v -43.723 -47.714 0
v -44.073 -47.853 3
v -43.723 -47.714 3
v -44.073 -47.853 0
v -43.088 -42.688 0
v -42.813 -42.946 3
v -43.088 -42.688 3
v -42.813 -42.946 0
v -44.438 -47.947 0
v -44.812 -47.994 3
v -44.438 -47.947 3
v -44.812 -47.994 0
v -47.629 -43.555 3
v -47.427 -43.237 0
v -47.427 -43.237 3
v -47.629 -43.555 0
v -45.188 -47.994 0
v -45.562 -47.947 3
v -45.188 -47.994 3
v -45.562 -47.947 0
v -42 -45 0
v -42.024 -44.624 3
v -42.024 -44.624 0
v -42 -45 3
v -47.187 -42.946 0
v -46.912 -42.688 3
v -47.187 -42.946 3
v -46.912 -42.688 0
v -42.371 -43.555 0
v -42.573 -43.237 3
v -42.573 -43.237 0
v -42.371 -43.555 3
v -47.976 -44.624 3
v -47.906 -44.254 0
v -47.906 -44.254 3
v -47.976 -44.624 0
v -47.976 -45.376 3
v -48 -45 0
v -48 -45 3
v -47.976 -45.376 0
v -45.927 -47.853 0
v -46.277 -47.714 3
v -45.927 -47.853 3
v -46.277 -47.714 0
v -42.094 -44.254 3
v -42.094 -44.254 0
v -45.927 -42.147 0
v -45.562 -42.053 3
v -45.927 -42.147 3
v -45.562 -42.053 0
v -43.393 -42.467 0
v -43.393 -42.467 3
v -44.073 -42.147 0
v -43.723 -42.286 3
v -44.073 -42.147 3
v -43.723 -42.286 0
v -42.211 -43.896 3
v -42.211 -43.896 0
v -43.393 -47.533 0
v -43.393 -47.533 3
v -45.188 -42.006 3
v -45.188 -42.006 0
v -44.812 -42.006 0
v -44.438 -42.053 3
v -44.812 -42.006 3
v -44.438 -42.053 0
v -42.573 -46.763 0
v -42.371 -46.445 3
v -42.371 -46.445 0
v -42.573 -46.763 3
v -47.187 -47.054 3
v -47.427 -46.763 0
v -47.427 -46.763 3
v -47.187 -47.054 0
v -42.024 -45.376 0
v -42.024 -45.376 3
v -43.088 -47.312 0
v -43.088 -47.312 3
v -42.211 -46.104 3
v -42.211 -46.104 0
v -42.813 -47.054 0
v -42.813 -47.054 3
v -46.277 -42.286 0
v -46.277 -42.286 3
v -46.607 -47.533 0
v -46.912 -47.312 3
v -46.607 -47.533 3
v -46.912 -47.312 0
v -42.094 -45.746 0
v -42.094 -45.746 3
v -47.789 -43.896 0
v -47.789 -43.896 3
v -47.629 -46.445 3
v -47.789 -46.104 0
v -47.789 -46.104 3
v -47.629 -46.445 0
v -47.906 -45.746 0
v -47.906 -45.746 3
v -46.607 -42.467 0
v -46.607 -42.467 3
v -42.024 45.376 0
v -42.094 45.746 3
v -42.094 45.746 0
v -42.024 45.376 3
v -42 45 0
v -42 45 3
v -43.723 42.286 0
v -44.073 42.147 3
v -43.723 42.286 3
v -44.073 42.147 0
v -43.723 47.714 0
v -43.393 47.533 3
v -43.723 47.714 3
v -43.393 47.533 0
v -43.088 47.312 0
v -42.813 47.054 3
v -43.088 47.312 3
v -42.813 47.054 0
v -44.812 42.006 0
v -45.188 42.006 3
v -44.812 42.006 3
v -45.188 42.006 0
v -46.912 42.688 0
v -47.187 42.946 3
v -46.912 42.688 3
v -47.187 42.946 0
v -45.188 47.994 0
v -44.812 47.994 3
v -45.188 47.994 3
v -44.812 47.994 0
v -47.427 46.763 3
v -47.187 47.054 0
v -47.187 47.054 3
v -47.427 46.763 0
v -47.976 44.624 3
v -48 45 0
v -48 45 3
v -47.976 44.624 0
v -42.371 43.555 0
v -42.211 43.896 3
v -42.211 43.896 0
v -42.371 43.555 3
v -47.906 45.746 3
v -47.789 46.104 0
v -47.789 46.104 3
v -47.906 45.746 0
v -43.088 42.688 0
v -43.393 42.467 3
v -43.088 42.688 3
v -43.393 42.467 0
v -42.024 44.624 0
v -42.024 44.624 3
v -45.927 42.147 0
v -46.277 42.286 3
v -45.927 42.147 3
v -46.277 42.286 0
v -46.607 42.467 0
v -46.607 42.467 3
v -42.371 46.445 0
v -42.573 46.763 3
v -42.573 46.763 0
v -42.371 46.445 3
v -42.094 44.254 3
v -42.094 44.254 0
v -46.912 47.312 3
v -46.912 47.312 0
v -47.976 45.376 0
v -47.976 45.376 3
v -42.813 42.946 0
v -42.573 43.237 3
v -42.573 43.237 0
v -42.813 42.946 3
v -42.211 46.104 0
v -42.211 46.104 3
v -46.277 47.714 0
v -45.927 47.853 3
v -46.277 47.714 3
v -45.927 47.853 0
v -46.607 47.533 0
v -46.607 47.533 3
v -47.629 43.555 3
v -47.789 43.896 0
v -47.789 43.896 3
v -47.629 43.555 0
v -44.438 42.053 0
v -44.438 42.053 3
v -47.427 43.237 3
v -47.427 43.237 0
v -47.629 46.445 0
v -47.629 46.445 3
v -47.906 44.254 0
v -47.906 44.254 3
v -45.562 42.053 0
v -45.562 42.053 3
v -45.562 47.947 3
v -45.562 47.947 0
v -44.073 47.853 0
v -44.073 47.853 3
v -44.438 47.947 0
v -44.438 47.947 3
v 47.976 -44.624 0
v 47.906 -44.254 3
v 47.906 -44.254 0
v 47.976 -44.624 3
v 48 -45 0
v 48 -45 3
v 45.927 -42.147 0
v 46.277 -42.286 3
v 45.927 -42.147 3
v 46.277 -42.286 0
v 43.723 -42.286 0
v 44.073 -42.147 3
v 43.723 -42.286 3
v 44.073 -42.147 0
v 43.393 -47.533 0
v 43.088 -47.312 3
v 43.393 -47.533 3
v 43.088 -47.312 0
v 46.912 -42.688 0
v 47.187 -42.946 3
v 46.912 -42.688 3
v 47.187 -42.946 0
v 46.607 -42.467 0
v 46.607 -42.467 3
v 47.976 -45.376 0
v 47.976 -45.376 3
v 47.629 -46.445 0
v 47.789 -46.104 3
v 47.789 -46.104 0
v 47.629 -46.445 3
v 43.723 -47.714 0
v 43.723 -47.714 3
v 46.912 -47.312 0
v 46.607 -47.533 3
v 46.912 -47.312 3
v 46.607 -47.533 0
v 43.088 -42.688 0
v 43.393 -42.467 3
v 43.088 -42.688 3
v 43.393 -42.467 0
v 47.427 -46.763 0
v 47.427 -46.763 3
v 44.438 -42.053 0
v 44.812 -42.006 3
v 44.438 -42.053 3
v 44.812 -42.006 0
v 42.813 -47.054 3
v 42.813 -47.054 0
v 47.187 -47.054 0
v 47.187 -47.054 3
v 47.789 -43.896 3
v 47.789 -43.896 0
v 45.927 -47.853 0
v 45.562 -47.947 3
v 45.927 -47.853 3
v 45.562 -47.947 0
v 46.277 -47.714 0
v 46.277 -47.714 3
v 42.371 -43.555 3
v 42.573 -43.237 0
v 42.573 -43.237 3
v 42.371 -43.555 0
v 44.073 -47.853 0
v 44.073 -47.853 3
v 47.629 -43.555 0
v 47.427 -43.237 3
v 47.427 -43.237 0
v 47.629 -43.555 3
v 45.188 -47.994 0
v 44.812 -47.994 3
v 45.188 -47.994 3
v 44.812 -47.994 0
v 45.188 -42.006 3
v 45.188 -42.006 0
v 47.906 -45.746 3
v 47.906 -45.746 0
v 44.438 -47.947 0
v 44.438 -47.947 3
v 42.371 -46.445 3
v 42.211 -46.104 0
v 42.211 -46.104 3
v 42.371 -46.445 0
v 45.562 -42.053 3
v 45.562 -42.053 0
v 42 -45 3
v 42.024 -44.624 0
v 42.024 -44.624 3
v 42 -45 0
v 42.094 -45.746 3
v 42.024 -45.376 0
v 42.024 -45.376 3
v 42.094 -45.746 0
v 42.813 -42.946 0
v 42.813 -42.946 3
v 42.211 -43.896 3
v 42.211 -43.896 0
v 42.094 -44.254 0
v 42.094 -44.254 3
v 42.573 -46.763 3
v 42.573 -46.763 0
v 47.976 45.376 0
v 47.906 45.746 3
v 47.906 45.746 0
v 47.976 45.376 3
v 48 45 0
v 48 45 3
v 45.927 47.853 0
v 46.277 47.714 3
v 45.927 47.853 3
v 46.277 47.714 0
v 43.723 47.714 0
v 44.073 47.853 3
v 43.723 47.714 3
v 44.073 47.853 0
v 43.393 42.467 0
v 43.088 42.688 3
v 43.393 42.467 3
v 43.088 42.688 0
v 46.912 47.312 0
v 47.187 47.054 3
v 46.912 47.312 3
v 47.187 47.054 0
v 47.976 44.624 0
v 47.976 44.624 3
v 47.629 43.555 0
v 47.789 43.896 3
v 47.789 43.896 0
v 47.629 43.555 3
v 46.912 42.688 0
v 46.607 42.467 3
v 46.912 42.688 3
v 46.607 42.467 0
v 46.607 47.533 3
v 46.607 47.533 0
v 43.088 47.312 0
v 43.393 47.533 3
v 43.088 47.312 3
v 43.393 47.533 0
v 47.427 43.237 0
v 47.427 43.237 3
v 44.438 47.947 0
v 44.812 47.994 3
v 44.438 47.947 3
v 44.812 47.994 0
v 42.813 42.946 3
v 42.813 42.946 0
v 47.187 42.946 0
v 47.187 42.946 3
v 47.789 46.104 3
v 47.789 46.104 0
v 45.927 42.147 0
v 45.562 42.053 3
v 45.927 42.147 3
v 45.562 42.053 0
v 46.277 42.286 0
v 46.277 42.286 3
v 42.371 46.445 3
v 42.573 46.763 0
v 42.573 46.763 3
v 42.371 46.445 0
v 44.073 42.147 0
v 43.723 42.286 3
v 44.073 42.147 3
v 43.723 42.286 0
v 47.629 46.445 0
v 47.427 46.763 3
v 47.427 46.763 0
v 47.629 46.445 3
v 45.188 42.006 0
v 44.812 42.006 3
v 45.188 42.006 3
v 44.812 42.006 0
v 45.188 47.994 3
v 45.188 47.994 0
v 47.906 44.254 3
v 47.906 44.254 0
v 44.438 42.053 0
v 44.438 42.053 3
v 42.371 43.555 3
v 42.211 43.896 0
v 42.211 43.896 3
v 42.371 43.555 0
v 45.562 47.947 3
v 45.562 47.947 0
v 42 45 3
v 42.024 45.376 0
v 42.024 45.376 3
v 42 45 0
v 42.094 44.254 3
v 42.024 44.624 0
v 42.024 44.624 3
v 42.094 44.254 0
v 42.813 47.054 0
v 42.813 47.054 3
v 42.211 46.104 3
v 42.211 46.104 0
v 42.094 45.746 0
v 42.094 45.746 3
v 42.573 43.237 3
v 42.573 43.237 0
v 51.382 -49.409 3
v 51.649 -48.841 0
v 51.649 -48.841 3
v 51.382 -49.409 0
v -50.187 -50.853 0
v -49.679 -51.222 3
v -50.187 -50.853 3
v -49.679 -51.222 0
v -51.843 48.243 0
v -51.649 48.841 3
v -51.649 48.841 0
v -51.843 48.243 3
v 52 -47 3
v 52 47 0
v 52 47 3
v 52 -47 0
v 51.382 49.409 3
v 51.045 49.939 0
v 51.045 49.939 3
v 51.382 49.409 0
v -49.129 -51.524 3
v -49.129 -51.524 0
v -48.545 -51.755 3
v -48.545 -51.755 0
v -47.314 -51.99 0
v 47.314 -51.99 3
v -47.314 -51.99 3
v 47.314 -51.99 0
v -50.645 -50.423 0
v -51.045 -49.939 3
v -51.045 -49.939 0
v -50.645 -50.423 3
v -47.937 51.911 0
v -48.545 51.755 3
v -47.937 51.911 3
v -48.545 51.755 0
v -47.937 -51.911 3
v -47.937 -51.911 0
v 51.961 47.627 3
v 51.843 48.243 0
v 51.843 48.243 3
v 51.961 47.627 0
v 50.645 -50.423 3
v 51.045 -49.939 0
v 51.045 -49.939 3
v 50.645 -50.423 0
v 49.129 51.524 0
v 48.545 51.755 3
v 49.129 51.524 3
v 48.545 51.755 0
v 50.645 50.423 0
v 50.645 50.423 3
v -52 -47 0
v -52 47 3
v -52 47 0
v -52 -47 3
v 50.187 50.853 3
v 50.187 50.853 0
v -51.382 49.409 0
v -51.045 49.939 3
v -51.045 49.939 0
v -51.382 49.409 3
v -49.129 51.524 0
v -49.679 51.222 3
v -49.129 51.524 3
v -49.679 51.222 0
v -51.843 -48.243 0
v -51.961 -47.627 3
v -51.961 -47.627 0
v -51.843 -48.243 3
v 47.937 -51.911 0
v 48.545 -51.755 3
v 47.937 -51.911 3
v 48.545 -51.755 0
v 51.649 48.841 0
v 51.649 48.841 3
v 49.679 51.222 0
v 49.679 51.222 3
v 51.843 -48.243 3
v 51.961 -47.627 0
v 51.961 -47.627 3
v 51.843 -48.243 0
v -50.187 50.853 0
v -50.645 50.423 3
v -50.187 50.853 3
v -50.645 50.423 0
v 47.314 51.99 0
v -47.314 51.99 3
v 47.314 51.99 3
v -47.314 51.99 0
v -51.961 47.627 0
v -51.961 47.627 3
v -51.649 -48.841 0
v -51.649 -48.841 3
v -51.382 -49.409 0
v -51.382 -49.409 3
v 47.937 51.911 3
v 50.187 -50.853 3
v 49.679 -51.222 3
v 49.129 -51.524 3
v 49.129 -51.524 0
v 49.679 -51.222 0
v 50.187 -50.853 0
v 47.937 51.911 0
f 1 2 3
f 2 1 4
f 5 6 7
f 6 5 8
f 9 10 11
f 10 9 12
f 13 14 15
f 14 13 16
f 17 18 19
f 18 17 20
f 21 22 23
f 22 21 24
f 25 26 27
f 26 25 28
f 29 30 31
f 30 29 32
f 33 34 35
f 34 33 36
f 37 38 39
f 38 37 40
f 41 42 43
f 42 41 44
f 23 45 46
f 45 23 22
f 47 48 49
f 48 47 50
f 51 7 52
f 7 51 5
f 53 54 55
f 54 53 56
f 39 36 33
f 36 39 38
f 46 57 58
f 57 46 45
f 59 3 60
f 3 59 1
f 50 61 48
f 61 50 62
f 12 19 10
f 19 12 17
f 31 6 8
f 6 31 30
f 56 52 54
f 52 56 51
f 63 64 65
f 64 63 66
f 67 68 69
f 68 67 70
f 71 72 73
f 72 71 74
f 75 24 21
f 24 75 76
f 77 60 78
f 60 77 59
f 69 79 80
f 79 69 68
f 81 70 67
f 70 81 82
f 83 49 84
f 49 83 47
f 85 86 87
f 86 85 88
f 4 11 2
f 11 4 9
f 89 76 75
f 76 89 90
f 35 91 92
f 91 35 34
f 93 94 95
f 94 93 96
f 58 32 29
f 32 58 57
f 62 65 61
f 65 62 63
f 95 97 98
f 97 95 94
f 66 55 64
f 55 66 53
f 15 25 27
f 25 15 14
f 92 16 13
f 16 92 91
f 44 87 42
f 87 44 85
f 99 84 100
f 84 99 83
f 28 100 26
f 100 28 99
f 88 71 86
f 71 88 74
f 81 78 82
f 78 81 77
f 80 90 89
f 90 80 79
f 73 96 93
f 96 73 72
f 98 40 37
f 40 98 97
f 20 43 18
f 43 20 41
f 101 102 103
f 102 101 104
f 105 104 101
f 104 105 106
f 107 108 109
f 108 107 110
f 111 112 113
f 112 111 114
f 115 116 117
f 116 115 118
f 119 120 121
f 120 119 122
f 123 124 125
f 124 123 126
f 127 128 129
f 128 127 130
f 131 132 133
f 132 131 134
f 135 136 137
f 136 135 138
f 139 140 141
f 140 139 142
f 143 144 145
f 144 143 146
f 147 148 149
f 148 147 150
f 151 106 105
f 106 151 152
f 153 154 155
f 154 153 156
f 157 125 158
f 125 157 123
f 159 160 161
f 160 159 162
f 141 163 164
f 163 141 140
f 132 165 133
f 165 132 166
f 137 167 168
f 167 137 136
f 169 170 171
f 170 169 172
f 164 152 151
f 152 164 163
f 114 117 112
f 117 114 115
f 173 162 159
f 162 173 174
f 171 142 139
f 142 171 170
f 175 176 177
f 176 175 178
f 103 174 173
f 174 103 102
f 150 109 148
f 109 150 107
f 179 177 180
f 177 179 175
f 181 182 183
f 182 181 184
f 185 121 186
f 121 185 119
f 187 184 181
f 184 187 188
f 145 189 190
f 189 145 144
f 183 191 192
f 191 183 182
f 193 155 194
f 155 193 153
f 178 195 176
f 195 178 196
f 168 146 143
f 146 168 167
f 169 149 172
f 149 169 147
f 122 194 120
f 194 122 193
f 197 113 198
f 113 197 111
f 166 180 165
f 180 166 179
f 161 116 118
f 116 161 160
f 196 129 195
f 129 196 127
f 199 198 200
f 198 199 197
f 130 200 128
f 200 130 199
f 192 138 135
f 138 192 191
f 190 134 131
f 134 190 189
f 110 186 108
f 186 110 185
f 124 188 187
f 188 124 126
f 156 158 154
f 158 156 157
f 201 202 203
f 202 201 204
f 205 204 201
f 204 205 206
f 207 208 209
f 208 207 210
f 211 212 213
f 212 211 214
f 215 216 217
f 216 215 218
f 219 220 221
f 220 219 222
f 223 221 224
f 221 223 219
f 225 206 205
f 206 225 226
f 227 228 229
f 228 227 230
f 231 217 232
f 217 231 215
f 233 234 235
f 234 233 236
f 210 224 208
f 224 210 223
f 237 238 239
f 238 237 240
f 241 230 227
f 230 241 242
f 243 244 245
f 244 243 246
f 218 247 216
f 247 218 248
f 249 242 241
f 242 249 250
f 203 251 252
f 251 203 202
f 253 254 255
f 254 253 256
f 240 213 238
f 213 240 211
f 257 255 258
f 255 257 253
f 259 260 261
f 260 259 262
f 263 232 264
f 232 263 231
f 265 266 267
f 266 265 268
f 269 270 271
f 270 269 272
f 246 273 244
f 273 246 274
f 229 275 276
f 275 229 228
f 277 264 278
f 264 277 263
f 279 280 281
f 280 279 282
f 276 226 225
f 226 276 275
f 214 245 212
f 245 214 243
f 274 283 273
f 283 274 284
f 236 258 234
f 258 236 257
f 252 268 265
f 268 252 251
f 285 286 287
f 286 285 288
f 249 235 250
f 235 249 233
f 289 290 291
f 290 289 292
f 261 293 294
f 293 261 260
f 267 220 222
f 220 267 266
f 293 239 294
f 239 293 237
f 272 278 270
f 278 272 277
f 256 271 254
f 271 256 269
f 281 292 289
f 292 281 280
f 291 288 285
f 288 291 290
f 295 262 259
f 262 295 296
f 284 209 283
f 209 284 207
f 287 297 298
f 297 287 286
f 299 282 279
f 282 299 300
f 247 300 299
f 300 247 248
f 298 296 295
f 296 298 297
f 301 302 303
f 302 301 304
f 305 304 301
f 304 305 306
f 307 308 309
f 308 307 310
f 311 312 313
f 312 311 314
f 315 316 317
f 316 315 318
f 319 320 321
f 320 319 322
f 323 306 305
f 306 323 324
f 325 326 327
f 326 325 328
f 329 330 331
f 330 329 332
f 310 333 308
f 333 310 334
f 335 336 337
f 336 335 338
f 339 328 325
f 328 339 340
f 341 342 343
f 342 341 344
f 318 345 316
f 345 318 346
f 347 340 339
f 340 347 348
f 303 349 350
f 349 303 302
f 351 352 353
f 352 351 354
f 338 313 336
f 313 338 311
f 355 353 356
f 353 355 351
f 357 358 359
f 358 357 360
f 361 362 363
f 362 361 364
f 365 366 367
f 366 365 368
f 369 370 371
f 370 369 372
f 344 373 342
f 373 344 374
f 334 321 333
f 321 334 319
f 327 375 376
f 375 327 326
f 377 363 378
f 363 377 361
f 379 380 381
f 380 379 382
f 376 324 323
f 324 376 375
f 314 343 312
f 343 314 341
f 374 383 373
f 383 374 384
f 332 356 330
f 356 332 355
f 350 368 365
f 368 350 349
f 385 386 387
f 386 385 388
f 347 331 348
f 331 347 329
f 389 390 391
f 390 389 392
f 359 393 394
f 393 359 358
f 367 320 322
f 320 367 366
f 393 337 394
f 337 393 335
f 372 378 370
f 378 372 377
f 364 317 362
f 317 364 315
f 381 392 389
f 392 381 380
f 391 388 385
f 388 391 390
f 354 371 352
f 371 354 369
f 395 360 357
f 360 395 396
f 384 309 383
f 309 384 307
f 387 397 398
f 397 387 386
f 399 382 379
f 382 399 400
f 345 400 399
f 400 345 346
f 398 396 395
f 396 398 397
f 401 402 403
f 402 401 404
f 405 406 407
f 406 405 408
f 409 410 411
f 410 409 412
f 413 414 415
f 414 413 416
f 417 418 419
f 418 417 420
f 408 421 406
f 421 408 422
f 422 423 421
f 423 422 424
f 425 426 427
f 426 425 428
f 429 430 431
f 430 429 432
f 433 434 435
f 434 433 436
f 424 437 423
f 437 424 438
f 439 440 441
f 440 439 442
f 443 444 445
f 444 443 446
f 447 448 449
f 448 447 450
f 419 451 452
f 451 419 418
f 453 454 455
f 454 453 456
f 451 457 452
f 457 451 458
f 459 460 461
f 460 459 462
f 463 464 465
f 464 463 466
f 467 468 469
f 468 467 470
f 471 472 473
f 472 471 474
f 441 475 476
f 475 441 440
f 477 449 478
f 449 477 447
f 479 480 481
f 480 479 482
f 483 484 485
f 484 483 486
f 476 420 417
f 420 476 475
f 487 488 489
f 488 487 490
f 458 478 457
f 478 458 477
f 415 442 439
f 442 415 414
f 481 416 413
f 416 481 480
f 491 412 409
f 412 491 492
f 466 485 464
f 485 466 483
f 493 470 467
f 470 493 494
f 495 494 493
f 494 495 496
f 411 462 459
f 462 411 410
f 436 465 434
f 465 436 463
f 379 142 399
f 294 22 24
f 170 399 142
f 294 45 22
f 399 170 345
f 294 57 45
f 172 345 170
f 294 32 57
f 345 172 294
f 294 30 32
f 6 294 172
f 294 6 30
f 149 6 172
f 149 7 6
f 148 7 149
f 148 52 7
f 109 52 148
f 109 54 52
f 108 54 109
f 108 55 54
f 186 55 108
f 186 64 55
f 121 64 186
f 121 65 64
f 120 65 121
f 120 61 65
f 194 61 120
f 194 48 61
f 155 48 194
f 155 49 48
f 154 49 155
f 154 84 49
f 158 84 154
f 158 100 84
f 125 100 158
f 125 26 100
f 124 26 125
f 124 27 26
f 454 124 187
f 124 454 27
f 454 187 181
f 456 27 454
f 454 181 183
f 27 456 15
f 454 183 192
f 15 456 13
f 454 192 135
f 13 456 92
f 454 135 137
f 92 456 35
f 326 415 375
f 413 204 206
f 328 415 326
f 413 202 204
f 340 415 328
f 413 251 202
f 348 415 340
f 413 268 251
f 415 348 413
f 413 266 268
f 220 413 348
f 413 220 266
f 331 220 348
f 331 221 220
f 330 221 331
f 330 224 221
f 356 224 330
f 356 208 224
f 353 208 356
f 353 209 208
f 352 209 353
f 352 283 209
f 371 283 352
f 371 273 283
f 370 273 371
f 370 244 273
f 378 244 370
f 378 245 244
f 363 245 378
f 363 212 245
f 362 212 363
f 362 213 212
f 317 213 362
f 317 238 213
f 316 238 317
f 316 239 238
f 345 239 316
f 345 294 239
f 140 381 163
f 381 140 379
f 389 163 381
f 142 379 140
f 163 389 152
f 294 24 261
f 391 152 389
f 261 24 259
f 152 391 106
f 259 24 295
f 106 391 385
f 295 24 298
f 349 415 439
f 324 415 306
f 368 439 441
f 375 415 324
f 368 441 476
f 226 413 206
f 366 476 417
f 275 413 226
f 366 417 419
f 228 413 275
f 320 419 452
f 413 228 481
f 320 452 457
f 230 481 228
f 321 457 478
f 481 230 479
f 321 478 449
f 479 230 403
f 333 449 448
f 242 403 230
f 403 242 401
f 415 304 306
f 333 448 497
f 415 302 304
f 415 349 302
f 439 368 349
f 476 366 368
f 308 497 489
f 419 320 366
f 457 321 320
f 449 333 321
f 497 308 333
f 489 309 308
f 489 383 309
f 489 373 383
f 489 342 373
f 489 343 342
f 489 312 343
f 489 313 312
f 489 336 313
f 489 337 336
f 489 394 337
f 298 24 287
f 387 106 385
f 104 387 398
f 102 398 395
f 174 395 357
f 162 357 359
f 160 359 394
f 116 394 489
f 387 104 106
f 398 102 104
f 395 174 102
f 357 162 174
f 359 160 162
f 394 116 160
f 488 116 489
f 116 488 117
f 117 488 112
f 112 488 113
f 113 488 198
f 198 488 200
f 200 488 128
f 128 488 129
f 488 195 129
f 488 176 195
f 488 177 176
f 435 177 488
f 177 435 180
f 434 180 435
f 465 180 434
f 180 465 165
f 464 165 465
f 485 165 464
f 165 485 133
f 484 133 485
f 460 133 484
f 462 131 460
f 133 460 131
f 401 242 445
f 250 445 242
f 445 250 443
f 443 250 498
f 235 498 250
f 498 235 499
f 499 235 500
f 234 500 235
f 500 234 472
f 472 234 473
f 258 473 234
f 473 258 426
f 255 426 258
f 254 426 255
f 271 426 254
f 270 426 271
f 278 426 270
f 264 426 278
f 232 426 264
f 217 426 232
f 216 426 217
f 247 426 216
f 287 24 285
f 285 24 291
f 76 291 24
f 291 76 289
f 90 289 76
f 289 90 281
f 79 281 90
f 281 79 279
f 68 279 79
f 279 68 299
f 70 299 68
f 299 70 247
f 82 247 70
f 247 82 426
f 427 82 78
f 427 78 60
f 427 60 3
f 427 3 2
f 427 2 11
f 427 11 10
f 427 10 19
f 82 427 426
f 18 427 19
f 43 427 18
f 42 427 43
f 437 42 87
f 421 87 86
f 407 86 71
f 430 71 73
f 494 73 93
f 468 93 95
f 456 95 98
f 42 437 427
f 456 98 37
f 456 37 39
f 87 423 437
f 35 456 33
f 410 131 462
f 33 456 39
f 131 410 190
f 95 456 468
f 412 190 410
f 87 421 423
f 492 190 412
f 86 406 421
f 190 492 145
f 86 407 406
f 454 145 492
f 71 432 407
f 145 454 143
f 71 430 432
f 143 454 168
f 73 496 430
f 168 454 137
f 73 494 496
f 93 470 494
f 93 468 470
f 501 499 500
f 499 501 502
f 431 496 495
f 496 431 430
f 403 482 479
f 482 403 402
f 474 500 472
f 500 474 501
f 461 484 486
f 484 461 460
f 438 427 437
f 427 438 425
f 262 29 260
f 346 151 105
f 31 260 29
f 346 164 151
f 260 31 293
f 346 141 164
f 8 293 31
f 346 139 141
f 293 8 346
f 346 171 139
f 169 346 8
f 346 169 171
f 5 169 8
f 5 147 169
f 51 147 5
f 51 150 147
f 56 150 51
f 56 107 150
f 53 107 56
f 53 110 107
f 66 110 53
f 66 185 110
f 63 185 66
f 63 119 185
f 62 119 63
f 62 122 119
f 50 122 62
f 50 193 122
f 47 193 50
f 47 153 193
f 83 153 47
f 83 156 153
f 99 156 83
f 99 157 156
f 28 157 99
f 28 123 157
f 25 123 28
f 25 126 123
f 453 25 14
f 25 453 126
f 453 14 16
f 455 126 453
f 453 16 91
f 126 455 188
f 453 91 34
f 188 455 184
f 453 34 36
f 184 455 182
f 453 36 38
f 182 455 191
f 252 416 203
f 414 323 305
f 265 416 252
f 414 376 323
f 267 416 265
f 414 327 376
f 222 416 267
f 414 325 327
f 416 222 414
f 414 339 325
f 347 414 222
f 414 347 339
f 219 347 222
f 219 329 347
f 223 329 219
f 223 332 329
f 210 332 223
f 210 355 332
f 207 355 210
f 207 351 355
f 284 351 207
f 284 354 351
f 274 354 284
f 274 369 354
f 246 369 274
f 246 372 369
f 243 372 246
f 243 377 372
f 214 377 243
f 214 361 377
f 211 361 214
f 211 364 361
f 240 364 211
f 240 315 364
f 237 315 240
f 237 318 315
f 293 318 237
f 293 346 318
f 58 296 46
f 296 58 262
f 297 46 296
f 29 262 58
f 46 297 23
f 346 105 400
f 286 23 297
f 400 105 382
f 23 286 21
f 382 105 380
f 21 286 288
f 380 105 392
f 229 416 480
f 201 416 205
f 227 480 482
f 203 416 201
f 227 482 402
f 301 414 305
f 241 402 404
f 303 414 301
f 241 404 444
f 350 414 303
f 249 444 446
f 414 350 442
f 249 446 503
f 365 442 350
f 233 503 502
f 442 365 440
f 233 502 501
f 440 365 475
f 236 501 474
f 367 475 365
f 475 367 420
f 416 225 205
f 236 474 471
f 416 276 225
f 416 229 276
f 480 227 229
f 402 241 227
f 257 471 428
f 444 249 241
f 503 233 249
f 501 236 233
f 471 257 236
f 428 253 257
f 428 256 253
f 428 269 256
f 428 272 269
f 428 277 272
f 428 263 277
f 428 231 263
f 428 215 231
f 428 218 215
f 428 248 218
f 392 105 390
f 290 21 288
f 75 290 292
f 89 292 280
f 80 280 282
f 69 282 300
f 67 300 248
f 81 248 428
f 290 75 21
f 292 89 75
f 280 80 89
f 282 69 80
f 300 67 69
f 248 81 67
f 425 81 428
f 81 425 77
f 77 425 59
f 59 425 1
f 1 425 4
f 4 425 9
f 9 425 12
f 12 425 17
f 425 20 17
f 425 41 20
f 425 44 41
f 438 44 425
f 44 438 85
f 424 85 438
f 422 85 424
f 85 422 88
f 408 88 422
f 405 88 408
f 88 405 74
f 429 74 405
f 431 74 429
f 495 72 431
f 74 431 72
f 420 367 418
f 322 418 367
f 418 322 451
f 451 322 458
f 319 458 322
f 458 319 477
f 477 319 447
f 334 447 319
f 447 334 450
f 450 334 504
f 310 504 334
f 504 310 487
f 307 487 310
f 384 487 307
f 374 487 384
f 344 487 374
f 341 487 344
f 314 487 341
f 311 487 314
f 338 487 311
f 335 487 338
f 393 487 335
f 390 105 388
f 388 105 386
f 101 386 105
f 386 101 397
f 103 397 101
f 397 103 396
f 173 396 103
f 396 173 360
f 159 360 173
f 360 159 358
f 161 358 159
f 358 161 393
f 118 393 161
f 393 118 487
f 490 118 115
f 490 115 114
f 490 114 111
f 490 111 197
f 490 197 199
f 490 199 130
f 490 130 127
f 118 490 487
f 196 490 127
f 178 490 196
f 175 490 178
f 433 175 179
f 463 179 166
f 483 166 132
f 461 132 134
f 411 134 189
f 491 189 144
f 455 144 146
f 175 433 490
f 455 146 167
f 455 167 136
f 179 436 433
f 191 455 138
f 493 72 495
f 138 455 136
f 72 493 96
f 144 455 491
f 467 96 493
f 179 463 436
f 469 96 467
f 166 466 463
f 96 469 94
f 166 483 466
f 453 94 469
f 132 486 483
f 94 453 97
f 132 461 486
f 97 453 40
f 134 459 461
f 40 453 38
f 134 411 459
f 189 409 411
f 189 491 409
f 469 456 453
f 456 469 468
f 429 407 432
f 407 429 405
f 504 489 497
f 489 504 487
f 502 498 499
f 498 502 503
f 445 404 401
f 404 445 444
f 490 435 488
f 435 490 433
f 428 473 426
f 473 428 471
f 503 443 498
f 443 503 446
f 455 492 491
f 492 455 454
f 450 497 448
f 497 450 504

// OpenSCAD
$fn = 50;


difference() {
	union() {
		hull() {
			translate(v = [-47.0000000000, 47.0000000000, 0]) {
				cylinder(h = 3, r = 5);
			}
			translate(v = [47.0000000000, 47.0000000000, 0]) {
				cylinder(h = 3, r = 5);
			}
			translate(v = [-47.0000000000, -47.0000000000, 0]) {
				cylinder(h = 3, r = 5);
			}
			translate(v = [47.0000000000, -47.0000000000, 0]) {
				cylinder(h = 3, r = 5);
			}
		}
	}
	union() {
		translate(v = [-45.0000000000, -45.0000000000, -100.0000000000]) {
			cylinder(h = 200, r = 3.0000000000);
		}
		translate(v = [-45.0000000000, 45.0000000000, -100.0000000000]) {
			cylinder(h = 200, r = 3.0000000000);
		}
		translate(v = [45.0000000000, -45.0000000000, -100.0000000000]) {
			cylinder(h = 200, r = 3.0000000000);
		}
		translate(v = [45.0000000000, 45.0000000000, -100.0000000000]) {
			cylinder(h = 200, r = 3.0000000000);
		}
	}
}
